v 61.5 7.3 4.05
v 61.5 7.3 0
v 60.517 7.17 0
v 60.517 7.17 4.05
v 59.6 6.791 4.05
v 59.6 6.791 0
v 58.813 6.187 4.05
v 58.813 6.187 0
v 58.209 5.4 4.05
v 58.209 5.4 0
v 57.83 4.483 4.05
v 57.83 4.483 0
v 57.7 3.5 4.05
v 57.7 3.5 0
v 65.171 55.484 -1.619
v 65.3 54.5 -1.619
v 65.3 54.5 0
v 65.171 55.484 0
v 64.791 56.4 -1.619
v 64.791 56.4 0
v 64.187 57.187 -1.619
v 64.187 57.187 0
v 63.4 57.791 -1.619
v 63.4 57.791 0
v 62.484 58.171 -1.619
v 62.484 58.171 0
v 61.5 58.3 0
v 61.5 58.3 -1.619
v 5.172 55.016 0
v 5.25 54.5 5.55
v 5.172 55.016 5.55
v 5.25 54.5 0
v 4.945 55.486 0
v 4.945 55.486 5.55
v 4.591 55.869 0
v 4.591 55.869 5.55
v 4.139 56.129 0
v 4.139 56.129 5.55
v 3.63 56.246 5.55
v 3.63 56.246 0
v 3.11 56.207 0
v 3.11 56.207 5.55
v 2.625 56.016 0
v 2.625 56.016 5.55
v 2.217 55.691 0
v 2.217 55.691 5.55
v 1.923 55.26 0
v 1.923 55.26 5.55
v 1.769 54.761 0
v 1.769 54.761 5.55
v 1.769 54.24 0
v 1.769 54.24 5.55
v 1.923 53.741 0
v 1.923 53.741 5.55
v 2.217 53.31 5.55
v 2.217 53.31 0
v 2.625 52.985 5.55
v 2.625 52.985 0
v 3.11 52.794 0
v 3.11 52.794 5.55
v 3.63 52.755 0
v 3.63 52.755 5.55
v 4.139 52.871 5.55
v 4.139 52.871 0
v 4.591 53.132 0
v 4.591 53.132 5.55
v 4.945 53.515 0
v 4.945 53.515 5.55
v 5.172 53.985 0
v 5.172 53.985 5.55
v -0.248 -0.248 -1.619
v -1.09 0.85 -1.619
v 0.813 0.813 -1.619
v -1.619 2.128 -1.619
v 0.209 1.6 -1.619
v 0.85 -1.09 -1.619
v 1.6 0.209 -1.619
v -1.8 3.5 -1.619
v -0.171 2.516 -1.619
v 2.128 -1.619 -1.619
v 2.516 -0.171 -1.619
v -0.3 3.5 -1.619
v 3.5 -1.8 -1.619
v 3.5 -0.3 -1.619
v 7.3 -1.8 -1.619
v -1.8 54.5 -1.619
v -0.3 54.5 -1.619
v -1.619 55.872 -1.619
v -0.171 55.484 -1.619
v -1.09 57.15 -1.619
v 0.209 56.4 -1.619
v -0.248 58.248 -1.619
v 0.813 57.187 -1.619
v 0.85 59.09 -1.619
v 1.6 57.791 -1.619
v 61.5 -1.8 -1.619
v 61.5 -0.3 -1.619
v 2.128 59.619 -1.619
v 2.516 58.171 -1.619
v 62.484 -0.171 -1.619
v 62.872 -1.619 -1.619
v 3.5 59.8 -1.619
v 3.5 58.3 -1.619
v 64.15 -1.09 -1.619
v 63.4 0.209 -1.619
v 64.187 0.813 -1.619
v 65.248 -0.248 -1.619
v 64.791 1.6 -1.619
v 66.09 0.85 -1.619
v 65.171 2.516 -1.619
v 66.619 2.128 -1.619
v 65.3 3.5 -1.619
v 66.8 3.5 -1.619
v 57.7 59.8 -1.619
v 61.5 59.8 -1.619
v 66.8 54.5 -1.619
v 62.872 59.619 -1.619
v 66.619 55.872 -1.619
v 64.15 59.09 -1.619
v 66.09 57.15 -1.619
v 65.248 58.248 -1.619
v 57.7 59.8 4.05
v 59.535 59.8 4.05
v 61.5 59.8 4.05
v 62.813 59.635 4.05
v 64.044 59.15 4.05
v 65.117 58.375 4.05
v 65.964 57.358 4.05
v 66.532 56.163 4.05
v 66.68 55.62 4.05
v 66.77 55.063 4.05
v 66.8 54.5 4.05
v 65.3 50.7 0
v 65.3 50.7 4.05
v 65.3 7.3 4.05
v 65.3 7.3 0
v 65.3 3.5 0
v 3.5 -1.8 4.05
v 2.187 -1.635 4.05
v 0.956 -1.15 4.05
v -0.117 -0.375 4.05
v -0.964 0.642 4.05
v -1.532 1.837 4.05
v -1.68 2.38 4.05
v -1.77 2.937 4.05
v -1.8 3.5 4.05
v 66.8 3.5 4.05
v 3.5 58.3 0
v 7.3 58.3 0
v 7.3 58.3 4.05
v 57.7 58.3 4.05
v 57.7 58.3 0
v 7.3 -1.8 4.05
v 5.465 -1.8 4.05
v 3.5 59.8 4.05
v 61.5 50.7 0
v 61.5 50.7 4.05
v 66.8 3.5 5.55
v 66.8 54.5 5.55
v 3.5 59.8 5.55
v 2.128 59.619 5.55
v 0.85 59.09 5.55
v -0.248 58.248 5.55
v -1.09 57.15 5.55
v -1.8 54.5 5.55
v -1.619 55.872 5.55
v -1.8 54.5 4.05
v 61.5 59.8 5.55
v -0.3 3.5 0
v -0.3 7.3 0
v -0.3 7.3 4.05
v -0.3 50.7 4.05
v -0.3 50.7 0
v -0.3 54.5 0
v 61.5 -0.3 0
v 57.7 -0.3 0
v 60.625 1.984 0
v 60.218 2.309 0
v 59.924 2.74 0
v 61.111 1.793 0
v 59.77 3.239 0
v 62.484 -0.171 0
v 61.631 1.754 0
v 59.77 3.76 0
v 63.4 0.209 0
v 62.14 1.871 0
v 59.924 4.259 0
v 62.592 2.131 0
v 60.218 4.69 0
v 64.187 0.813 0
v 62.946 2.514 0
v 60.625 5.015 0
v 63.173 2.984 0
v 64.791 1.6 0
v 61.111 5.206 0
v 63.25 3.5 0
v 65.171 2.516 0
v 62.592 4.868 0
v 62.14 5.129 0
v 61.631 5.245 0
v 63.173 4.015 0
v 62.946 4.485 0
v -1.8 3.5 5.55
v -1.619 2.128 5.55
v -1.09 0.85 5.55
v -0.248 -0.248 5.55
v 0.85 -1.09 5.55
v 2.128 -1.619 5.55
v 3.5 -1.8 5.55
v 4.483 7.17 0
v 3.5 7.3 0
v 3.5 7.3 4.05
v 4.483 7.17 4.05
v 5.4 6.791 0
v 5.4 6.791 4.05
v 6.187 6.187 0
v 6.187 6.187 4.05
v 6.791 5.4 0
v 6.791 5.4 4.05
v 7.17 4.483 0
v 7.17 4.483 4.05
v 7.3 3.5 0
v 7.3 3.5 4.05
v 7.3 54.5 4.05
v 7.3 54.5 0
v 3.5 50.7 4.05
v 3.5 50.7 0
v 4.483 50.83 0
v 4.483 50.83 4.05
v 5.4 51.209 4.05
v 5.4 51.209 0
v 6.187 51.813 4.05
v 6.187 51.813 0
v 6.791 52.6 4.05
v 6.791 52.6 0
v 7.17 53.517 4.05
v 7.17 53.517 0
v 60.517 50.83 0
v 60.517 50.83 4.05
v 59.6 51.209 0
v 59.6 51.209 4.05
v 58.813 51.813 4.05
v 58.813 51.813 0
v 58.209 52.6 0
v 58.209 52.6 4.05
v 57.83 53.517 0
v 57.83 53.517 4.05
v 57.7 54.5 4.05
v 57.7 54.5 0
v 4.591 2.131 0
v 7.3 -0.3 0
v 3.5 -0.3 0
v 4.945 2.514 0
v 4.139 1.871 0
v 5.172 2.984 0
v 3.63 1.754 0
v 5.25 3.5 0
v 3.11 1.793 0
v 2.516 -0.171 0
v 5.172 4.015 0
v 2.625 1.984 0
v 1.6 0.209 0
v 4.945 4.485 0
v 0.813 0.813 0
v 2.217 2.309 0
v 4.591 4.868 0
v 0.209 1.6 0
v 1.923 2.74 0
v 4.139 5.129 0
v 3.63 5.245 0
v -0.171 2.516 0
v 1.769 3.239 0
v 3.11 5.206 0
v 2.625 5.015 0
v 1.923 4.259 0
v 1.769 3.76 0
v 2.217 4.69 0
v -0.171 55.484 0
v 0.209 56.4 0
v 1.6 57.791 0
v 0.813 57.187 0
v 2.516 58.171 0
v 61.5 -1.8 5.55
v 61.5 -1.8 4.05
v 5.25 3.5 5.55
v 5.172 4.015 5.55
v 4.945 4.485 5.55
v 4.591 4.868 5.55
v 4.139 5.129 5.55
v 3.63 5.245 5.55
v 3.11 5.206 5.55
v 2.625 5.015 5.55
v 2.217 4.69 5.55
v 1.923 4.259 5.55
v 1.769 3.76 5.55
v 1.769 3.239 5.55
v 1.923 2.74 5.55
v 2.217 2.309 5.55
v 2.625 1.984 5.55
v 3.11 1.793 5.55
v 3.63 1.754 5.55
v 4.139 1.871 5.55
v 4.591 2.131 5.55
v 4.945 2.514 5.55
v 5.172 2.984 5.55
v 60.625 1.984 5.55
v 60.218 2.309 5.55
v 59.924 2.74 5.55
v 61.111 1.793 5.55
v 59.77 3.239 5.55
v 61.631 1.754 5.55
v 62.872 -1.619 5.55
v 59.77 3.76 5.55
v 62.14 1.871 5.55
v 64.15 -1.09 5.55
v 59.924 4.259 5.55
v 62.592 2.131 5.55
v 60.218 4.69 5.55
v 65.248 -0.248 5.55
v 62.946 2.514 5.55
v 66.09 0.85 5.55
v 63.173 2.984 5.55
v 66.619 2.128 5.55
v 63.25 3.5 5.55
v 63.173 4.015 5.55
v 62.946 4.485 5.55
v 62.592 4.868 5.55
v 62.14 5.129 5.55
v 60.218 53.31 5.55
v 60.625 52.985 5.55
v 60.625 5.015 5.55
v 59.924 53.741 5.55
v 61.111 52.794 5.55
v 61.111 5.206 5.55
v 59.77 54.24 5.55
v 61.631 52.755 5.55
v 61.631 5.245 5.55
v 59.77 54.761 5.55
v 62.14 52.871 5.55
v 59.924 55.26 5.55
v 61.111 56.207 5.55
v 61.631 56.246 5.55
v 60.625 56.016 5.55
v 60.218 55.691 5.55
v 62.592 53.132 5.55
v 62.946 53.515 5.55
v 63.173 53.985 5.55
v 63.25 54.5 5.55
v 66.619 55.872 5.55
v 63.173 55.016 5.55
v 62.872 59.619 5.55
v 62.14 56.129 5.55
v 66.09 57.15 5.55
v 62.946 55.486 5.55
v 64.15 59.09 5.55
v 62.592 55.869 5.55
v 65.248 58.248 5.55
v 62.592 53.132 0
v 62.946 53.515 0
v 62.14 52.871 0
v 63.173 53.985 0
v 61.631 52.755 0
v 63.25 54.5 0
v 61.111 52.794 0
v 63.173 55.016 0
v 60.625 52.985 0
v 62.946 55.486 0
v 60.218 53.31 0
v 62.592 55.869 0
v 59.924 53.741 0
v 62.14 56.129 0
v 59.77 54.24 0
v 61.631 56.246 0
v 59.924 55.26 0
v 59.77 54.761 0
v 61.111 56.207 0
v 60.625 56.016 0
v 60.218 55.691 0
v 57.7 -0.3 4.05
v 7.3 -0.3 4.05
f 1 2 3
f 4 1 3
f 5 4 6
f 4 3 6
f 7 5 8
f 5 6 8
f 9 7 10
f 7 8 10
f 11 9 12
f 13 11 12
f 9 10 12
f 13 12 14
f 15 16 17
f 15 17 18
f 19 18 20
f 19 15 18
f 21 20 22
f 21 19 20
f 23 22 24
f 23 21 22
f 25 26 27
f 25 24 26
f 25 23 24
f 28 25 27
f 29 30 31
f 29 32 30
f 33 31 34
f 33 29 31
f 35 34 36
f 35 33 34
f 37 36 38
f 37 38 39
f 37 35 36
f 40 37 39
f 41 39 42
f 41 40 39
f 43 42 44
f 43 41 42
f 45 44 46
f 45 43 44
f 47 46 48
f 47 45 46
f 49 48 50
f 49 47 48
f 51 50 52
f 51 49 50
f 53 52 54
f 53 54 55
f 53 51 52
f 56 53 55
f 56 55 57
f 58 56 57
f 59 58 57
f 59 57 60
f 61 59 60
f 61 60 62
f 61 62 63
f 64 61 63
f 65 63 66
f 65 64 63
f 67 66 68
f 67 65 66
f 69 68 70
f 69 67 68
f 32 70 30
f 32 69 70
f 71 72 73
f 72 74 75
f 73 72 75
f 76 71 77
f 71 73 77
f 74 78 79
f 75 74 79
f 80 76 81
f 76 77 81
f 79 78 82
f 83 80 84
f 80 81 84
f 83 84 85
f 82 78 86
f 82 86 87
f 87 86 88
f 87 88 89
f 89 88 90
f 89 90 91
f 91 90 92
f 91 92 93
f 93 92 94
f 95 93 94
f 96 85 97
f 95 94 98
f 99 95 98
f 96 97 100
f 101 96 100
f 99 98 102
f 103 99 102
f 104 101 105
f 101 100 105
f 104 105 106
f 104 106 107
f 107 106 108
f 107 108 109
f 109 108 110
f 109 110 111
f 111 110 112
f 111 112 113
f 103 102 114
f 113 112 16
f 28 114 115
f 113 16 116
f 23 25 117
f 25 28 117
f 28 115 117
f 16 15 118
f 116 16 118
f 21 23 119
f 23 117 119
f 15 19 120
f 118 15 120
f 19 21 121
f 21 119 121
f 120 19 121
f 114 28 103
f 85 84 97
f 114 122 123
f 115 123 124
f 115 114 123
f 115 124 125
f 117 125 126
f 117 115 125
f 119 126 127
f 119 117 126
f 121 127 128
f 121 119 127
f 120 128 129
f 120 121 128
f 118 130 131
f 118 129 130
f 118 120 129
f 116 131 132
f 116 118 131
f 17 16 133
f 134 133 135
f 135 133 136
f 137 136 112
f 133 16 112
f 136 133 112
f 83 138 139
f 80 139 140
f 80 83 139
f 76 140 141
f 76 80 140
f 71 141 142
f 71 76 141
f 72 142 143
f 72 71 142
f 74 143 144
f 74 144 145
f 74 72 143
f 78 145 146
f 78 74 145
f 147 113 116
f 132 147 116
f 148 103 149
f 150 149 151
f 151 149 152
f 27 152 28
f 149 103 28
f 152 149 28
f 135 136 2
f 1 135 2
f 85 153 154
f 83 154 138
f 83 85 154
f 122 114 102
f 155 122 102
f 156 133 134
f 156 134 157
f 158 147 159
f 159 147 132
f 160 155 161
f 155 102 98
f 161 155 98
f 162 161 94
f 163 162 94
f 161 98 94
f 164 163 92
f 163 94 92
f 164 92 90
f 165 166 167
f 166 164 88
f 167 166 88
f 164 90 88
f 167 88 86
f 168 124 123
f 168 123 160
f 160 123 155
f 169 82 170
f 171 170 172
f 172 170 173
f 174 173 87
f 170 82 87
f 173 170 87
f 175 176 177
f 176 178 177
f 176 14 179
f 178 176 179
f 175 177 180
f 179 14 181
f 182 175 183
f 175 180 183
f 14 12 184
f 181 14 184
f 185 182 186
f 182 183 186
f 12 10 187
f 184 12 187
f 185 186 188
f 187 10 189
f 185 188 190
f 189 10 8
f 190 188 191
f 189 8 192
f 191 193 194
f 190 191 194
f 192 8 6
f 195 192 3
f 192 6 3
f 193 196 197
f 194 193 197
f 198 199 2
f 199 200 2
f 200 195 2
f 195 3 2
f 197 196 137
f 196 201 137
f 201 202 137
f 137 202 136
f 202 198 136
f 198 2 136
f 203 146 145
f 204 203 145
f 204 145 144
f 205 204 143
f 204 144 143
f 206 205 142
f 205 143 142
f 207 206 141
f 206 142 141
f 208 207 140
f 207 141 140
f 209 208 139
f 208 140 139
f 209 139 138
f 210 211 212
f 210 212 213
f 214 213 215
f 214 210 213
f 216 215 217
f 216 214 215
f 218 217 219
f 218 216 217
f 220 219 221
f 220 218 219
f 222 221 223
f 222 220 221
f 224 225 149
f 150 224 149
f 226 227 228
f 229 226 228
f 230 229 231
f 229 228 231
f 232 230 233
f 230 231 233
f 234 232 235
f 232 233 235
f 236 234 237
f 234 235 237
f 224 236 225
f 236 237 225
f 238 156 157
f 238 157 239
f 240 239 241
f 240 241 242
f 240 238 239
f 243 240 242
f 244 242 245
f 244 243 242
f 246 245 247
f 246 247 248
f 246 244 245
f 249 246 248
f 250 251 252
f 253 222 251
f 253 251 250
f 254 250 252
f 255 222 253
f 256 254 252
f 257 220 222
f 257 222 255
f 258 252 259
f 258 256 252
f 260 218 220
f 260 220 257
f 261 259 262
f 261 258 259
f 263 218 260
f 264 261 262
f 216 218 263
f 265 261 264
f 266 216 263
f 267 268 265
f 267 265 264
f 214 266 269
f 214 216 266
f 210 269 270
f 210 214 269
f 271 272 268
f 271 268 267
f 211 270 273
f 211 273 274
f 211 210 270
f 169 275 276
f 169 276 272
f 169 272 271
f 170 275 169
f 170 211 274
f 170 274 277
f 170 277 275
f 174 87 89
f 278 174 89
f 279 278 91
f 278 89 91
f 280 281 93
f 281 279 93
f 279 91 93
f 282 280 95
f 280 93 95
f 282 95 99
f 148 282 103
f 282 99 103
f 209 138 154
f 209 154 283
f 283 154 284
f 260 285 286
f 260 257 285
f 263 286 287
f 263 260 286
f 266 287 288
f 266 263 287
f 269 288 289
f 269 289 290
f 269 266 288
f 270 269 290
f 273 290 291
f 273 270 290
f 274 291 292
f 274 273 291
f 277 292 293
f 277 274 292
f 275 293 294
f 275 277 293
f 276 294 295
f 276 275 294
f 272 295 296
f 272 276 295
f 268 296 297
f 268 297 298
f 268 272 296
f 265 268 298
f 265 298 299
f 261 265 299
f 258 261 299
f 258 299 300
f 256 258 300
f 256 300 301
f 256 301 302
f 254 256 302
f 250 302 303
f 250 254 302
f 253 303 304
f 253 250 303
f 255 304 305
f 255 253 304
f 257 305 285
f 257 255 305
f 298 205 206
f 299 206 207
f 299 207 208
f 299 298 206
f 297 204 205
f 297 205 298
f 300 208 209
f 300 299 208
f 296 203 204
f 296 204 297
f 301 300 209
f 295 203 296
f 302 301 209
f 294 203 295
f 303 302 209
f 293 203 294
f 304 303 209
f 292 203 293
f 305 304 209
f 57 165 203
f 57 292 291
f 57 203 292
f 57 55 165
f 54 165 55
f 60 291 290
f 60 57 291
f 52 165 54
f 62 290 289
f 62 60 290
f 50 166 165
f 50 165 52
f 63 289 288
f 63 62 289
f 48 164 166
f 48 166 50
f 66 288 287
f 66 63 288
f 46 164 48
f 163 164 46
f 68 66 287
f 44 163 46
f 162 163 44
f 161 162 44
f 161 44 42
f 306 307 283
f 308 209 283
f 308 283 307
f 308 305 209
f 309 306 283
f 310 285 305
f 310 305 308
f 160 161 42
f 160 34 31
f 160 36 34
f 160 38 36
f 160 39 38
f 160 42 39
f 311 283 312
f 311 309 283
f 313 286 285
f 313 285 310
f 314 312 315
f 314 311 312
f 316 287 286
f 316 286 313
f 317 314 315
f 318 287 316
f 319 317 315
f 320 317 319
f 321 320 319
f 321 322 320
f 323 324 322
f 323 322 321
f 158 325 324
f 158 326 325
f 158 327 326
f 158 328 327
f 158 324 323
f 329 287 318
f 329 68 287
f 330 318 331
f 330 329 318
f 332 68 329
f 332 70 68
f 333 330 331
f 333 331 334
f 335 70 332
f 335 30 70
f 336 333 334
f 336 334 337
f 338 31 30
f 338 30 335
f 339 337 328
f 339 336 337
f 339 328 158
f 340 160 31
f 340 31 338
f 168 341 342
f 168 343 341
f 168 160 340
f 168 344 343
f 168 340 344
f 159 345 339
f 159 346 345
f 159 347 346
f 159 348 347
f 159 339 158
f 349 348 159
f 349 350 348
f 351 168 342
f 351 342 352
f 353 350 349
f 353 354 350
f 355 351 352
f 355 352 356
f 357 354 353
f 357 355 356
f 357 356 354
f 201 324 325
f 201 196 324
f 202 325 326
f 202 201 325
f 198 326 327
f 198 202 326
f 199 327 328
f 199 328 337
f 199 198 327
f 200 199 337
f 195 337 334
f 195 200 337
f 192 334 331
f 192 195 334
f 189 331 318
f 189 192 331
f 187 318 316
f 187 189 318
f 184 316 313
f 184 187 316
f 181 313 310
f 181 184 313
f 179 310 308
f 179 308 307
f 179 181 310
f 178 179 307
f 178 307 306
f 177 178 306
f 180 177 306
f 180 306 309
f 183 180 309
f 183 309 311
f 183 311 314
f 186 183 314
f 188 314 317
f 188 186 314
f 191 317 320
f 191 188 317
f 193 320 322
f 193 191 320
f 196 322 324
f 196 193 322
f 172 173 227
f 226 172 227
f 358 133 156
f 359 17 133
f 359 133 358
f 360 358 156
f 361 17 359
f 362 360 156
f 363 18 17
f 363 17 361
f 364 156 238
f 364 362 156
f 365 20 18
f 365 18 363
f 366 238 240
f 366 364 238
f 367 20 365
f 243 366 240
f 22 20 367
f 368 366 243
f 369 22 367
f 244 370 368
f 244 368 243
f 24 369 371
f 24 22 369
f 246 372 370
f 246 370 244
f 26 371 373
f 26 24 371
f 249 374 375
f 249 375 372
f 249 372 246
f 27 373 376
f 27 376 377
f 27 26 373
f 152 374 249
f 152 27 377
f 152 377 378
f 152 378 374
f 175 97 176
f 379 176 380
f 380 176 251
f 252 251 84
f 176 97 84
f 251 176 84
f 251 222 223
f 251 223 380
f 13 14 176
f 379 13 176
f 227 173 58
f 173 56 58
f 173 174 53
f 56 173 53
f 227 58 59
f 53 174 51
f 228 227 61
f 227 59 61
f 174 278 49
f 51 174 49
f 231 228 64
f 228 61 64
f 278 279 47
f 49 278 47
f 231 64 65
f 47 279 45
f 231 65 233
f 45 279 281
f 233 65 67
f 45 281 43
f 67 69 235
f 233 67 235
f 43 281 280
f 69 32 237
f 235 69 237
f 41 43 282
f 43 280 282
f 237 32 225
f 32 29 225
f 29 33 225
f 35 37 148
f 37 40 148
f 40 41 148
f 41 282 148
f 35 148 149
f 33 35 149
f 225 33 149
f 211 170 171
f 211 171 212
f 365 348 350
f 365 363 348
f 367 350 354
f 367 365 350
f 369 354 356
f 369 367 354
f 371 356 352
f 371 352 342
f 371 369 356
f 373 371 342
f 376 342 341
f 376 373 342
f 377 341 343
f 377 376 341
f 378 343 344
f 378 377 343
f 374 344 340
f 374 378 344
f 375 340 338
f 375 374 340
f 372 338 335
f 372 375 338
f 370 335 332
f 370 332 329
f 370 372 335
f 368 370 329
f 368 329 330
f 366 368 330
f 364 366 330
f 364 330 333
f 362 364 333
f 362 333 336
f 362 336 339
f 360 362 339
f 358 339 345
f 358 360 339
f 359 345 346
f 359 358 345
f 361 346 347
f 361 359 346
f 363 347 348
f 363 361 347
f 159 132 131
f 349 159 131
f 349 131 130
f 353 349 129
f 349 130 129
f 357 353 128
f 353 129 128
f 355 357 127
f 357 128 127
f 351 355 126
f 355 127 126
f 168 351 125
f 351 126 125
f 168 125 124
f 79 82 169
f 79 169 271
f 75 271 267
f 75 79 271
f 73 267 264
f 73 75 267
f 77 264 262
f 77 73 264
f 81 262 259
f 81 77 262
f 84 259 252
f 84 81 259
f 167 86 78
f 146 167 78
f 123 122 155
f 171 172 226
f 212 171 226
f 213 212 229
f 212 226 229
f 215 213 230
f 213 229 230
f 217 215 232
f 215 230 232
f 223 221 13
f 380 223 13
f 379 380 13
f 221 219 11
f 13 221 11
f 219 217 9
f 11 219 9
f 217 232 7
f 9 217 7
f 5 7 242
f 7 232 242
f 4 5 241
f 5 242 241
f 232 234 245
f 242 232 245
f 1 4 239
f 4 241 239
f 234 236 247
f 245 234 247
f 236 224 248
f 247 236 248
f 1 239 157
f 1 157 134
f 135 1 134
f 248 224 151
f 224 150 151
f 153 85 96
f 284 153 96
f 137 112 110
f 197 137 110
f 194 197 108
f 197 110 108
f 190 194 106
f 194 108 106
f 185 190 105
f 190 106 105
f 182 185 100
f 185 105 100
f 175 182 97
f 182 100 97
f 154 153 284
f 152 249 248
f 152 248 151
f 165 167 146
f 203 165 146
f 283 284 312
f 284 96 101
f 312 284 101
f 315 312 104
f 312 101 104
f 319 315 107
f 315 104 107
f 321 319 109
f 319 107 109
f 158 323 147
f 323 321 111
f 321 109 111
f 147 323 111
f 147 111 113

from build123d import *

# Parameters (mm, degrees)
BOSS_EXTRUDE2_START     = -1.618999
SKETCH1_W               = 50.400855702
SKETCH1_H               = 1.5
SKETCH1_W_2             = 1.5
SKETCH1_H_2             = 43.400852302
BOSS_EXTRUDE2_DEPTH     = 5.668998934
SKETCH1_5_R             = 1.74999934
BOSS_EXTRUDE3_DEPTH     = 4.049997769
BOSS_EXTRUDE4_START     = 4.049997821
BOSS_EXTRUDE4_OUTLINE_R = 1.74999934
BOSS_EXTRUDE4_DEPTH     = 1.499999948


# Read off the part's stored shape, not the designer's step: Boss-Extrude4
with BuildPart() as part:
    # Sketch1 → Boss-Extrude2 (new body)
    with BuildSketch(Plane.XY.offset(BOSS_EXTRUDE2_START)):
        with BuildLine():
            Line((7.299572149, 59.8), (3.499574174, 59.8))
            ThreePointArc((3.499574174, 59.8), (-0.247791806, 58.247791067), (-1.8, 54.500424782))
            Line((-1.8, 54.500424782), (-1.8, 50.700426151))
            Line((-1.8, 50.700426151), (-0.3, 50.700426151))
            Line((-0.3, 50.700426151), (-0.3, 54.500425826))
            ThreePointArc((-0.3, 54.500425826), (0.812868735, 57.187131265), (3.499574174, 58.3))
            Line((3.499574174, 58.3), (7.299572149, 58.3))
            Line((7.299572149, 58.3), (7.299572149, 59.8))
        make_face()
        with Locations((32.5, 59.05)):
            Rectangle(SKETCH1_W, SKETCH1_H)
        with BuildLine():
            ThreePointArc((61.500425826, 59.799997355), (65.247788792, 58.247788792), (66.8, 54.500425826))
            Line((66.8, 54.500425826), (66.8, 50.700426151))
            Line((66.8, 50.700426151), (65.3, 50.700426151))
            Line((65.3, 50.700426151), (65.3, 54.500425826))
            ThreePointArc((65.3, 54.500425826), (64.18713049, 57.18713049), (61.500425826, 58.3))
            Line((61.500425826, 58.3), (57.700427851, 58.3))
            Line((57.700427851, 58.3), (57.700427851, 59.8))
            Line((57.700427851, 59.8), (61.500425826, 59.799997355))
        make_face()
        with Locations((66.05, 29)):
            Rectangle(SKETCH1_W_2, SKETCH1_H_2)
        with BuildLine():
            Line((57.700427851, -1.8), (61.500425826, -1.8))
            ThreePointArc((61.500425826, -1.8), (65.247791806, -0.247791067), (66.8, 3.499575218))
            Line((66.8, 3.499575218), (66.8, 7.299573849))
            Line((66.8, 7.299573849), (65.3, 7.299573849))
            Line((65.3, 7.299573849), (65.3, 3.499574174))
            ThreePointArc((65.3, 3.499574174), (64.187131265, 0.812868735), (61.500425826, -0.3))
            Line((61.500425826, -0.3), (57.700427851, -0.3))
            Line((57.700427851, -0.3), (57.700427851, -1.8))
        make_face()
        with Locations((32.5, -1.05)):
            Rectangle(SKETCH1_W, SKETCH1_H)
        with Locations((-1.05, 29)):
            Rectangle(SKETCH1_W_2, SKETCH1_H_2)
        with BuildLine():
            ThreePointArc((3.499576262, -1.800002645), (-0.247793343, -0.24779482), (-1.8, 3.499574174))
            Line((-1.8, 3.499574174), (-1.8, 7.299573849))
            Line((-1.8, 7.299573849), (-0.3, 7.299573849))
            Line((-0.3, 7.299573849), (-0.3, 3.499574174))
            ThreePointArc((-0.3, 3.499574174), (0.812867961, 0.812867961), (3.499574174, -0.3))
            Line((3.499574174, -0.3), (7.299572149, -0.3))
            Line((7.299572149, -0.3), (7.299572149, -1.8))
            Line((7.299572149, -1.8), (3.499576262, -1.800002645))
        make_face()
    extrude(amount=BOSS_EXTRUDE2_DEPTH)

    # Sketch1<5> → Boss-Extrude3 (add)
    # profile 1 of 4: a face of its own
    with BuildSketch(Plane.XY):
        with BuildLine():
            Line((7.299572149, 3.50000232), (7.299572149, -0.3))
            Line((7.299572149, -0.3), (3.499574174, -0.3))
            ThreePointArc((3.499574174, -0.3), (0.812867961, 0.812867961), (-0.3, 3.499574174))
            Line((-0.3, 3.499574174), (-0.3, 7.299573849))
            Line((-0.3, 7.299573849), (3.50000062, 7.299573849))
            ThreePointArc((3.50000062, 7.299573849), (6.186702813, 6.186704015), (7.299572149, 3.50000232))
        make_face()
        with Locations((3.499568884, 3.499568884)):
            Circle(SKETCH1_5_R, mode=Mode.SUBTRACT)
    # profile 2 of 4: a face of its own
    with BuildSketch(Plane.XY):
        with BuildLine():
            Line((7.299572149, 58.3), (3.499574174, 58.3))
            ThreePointArc((3.499574174, 58.3), (0.812868735, 57.187131265), (-0.3, 54.500425826))
            Line((-0.3, 54.500425826), (-0.3, 50.700426151))
            Line((-0.3, 50.700426151), (3.50000062, 50.700426151))
            ThreePointArc((3.50000062, 50.700426151), (6.186703414, 51.813294886), (7.299572149, 54.49999768))
            Line((7.299572149, 54.49999768), (7.299572149, 58.3))
        make_face()
        with Locations((3.499571529, 54.500428471)):
            Circle(SKETCH1_5_R, mode=Mode.SUBTRACT)
    # profile 3 of 4: a face of its own
    with BuildSketch(Plane.XY):
        with BuildLine():
            ThreePointArc((61.500425826, 58.3), (64.18713049, 57.18713049), (65.3, 54.500425826))
            Line((65.3, 54.500425826), (65.3, 50.700426151))
            Line((65.3, 50.700426151), (61.49999938, 50.700426151))
            ThreePointArc((61.49999938, 50.700426151), (58.813296614, 51.813295049), (57.700427851, 54.49999768))
            Line((57.700427851, 54.49999768), (57.700427851, 58.3))
            Line((57.700427851, 58.3), (61.500425826, 58.3))
        make_face()
        with Locations((61.500425826, 54.500425826)):
            Circle(SKETCH1_5_R, mode=Mode.SUBTRACT)
    # profile 4 of 4: a face of its own
    with BuildSketch(Plane.XY):
        with BuildLine():
            Line((57.700427851, -0.3), (61.500425826, -0.3))
            ThreePointArc((61.500425826, -0.3), (64.187131265, 0.812868735), (65.3, 3.499574174))
            Line((65.3, 3.499574174), (65.3, 7.299573849))
            Line((65.3, 7.299573849), (61.49999938, 7.299573849))
            ThreePointArc((61.49999938, 7.299573849), (58.813297215, 6.186703852), (57.700427851, 3.50000232))
            Line((57.700427851, 3.50000232), (57.700427851, -0.3))
        make_face()
        with Locations((61.500428471, 3.499571529)):
            Circle(SKETCH1_5_R, mode=Mode.SUBTRACT)
    extrude(amount=BOSS_EXTRUDE3_DEPTH)

    # Boss-Extrude4 outline → Boss-Extrude4 (add)
    with BuildSketch(Plane.XY.offset(BOSS_EXTRUDE4_START)):
        with BuildLine():
            ThreePointArc((-1.800001322, 3.499574174), (-0.247792408, -0.247793885), (3.499576262, -1.800001322))
            Line((3.499576262, -1.800001322), (61.500425826, -1.8))
            ThreePointArc((61.500425826, -1.8), (65.247791806, -0.247791067), (66.8, 3.499575218))
            Line((66.8, 3.499575218), (66.799998678, 54.500425826))
            ThreePointArc((66.799998678, 54.500425826), (65.247789727, 58.247789727), (61.500425826, 59.799998678))
            Line((61.500425826, 59.799998678), (3.499574174, 59.8))
            ThreePointArc((3.499574174, 59.8), (-0.247791806, 58.247791067), (-1.8, 54.500424782))
            Line((-1.8, 54.500424782), (-1.800001322, 3.499574174))
        make_face()
        with Locations((3.499568884, 3.499568884)):
            Circle(BOSS_EXTRUDE4_OUTLINE_R, mode=Mode.SUBTRACT)
        with Locations((61.500428471, 3.499571529)):
            Circle(BOSS_EXTRUDE4_OUTLINE_R, mode=Mode.SUBTRACT)
        with Locations((3.499571529, 54.500428471)):
            Circle(BOSS_EXTRUDE4_OUTLINE_R, mode=Mode.SUBTRACT)
        with Locations((61.500425826, 54.500425826)):
            Circle(BOSS_EXTRUDE4_OUTLINE_R, mode=Mode.SUBTRACT)
    extrude(amount=BOSS_EXTRUDE4_DEPTH)


solid = part.part
